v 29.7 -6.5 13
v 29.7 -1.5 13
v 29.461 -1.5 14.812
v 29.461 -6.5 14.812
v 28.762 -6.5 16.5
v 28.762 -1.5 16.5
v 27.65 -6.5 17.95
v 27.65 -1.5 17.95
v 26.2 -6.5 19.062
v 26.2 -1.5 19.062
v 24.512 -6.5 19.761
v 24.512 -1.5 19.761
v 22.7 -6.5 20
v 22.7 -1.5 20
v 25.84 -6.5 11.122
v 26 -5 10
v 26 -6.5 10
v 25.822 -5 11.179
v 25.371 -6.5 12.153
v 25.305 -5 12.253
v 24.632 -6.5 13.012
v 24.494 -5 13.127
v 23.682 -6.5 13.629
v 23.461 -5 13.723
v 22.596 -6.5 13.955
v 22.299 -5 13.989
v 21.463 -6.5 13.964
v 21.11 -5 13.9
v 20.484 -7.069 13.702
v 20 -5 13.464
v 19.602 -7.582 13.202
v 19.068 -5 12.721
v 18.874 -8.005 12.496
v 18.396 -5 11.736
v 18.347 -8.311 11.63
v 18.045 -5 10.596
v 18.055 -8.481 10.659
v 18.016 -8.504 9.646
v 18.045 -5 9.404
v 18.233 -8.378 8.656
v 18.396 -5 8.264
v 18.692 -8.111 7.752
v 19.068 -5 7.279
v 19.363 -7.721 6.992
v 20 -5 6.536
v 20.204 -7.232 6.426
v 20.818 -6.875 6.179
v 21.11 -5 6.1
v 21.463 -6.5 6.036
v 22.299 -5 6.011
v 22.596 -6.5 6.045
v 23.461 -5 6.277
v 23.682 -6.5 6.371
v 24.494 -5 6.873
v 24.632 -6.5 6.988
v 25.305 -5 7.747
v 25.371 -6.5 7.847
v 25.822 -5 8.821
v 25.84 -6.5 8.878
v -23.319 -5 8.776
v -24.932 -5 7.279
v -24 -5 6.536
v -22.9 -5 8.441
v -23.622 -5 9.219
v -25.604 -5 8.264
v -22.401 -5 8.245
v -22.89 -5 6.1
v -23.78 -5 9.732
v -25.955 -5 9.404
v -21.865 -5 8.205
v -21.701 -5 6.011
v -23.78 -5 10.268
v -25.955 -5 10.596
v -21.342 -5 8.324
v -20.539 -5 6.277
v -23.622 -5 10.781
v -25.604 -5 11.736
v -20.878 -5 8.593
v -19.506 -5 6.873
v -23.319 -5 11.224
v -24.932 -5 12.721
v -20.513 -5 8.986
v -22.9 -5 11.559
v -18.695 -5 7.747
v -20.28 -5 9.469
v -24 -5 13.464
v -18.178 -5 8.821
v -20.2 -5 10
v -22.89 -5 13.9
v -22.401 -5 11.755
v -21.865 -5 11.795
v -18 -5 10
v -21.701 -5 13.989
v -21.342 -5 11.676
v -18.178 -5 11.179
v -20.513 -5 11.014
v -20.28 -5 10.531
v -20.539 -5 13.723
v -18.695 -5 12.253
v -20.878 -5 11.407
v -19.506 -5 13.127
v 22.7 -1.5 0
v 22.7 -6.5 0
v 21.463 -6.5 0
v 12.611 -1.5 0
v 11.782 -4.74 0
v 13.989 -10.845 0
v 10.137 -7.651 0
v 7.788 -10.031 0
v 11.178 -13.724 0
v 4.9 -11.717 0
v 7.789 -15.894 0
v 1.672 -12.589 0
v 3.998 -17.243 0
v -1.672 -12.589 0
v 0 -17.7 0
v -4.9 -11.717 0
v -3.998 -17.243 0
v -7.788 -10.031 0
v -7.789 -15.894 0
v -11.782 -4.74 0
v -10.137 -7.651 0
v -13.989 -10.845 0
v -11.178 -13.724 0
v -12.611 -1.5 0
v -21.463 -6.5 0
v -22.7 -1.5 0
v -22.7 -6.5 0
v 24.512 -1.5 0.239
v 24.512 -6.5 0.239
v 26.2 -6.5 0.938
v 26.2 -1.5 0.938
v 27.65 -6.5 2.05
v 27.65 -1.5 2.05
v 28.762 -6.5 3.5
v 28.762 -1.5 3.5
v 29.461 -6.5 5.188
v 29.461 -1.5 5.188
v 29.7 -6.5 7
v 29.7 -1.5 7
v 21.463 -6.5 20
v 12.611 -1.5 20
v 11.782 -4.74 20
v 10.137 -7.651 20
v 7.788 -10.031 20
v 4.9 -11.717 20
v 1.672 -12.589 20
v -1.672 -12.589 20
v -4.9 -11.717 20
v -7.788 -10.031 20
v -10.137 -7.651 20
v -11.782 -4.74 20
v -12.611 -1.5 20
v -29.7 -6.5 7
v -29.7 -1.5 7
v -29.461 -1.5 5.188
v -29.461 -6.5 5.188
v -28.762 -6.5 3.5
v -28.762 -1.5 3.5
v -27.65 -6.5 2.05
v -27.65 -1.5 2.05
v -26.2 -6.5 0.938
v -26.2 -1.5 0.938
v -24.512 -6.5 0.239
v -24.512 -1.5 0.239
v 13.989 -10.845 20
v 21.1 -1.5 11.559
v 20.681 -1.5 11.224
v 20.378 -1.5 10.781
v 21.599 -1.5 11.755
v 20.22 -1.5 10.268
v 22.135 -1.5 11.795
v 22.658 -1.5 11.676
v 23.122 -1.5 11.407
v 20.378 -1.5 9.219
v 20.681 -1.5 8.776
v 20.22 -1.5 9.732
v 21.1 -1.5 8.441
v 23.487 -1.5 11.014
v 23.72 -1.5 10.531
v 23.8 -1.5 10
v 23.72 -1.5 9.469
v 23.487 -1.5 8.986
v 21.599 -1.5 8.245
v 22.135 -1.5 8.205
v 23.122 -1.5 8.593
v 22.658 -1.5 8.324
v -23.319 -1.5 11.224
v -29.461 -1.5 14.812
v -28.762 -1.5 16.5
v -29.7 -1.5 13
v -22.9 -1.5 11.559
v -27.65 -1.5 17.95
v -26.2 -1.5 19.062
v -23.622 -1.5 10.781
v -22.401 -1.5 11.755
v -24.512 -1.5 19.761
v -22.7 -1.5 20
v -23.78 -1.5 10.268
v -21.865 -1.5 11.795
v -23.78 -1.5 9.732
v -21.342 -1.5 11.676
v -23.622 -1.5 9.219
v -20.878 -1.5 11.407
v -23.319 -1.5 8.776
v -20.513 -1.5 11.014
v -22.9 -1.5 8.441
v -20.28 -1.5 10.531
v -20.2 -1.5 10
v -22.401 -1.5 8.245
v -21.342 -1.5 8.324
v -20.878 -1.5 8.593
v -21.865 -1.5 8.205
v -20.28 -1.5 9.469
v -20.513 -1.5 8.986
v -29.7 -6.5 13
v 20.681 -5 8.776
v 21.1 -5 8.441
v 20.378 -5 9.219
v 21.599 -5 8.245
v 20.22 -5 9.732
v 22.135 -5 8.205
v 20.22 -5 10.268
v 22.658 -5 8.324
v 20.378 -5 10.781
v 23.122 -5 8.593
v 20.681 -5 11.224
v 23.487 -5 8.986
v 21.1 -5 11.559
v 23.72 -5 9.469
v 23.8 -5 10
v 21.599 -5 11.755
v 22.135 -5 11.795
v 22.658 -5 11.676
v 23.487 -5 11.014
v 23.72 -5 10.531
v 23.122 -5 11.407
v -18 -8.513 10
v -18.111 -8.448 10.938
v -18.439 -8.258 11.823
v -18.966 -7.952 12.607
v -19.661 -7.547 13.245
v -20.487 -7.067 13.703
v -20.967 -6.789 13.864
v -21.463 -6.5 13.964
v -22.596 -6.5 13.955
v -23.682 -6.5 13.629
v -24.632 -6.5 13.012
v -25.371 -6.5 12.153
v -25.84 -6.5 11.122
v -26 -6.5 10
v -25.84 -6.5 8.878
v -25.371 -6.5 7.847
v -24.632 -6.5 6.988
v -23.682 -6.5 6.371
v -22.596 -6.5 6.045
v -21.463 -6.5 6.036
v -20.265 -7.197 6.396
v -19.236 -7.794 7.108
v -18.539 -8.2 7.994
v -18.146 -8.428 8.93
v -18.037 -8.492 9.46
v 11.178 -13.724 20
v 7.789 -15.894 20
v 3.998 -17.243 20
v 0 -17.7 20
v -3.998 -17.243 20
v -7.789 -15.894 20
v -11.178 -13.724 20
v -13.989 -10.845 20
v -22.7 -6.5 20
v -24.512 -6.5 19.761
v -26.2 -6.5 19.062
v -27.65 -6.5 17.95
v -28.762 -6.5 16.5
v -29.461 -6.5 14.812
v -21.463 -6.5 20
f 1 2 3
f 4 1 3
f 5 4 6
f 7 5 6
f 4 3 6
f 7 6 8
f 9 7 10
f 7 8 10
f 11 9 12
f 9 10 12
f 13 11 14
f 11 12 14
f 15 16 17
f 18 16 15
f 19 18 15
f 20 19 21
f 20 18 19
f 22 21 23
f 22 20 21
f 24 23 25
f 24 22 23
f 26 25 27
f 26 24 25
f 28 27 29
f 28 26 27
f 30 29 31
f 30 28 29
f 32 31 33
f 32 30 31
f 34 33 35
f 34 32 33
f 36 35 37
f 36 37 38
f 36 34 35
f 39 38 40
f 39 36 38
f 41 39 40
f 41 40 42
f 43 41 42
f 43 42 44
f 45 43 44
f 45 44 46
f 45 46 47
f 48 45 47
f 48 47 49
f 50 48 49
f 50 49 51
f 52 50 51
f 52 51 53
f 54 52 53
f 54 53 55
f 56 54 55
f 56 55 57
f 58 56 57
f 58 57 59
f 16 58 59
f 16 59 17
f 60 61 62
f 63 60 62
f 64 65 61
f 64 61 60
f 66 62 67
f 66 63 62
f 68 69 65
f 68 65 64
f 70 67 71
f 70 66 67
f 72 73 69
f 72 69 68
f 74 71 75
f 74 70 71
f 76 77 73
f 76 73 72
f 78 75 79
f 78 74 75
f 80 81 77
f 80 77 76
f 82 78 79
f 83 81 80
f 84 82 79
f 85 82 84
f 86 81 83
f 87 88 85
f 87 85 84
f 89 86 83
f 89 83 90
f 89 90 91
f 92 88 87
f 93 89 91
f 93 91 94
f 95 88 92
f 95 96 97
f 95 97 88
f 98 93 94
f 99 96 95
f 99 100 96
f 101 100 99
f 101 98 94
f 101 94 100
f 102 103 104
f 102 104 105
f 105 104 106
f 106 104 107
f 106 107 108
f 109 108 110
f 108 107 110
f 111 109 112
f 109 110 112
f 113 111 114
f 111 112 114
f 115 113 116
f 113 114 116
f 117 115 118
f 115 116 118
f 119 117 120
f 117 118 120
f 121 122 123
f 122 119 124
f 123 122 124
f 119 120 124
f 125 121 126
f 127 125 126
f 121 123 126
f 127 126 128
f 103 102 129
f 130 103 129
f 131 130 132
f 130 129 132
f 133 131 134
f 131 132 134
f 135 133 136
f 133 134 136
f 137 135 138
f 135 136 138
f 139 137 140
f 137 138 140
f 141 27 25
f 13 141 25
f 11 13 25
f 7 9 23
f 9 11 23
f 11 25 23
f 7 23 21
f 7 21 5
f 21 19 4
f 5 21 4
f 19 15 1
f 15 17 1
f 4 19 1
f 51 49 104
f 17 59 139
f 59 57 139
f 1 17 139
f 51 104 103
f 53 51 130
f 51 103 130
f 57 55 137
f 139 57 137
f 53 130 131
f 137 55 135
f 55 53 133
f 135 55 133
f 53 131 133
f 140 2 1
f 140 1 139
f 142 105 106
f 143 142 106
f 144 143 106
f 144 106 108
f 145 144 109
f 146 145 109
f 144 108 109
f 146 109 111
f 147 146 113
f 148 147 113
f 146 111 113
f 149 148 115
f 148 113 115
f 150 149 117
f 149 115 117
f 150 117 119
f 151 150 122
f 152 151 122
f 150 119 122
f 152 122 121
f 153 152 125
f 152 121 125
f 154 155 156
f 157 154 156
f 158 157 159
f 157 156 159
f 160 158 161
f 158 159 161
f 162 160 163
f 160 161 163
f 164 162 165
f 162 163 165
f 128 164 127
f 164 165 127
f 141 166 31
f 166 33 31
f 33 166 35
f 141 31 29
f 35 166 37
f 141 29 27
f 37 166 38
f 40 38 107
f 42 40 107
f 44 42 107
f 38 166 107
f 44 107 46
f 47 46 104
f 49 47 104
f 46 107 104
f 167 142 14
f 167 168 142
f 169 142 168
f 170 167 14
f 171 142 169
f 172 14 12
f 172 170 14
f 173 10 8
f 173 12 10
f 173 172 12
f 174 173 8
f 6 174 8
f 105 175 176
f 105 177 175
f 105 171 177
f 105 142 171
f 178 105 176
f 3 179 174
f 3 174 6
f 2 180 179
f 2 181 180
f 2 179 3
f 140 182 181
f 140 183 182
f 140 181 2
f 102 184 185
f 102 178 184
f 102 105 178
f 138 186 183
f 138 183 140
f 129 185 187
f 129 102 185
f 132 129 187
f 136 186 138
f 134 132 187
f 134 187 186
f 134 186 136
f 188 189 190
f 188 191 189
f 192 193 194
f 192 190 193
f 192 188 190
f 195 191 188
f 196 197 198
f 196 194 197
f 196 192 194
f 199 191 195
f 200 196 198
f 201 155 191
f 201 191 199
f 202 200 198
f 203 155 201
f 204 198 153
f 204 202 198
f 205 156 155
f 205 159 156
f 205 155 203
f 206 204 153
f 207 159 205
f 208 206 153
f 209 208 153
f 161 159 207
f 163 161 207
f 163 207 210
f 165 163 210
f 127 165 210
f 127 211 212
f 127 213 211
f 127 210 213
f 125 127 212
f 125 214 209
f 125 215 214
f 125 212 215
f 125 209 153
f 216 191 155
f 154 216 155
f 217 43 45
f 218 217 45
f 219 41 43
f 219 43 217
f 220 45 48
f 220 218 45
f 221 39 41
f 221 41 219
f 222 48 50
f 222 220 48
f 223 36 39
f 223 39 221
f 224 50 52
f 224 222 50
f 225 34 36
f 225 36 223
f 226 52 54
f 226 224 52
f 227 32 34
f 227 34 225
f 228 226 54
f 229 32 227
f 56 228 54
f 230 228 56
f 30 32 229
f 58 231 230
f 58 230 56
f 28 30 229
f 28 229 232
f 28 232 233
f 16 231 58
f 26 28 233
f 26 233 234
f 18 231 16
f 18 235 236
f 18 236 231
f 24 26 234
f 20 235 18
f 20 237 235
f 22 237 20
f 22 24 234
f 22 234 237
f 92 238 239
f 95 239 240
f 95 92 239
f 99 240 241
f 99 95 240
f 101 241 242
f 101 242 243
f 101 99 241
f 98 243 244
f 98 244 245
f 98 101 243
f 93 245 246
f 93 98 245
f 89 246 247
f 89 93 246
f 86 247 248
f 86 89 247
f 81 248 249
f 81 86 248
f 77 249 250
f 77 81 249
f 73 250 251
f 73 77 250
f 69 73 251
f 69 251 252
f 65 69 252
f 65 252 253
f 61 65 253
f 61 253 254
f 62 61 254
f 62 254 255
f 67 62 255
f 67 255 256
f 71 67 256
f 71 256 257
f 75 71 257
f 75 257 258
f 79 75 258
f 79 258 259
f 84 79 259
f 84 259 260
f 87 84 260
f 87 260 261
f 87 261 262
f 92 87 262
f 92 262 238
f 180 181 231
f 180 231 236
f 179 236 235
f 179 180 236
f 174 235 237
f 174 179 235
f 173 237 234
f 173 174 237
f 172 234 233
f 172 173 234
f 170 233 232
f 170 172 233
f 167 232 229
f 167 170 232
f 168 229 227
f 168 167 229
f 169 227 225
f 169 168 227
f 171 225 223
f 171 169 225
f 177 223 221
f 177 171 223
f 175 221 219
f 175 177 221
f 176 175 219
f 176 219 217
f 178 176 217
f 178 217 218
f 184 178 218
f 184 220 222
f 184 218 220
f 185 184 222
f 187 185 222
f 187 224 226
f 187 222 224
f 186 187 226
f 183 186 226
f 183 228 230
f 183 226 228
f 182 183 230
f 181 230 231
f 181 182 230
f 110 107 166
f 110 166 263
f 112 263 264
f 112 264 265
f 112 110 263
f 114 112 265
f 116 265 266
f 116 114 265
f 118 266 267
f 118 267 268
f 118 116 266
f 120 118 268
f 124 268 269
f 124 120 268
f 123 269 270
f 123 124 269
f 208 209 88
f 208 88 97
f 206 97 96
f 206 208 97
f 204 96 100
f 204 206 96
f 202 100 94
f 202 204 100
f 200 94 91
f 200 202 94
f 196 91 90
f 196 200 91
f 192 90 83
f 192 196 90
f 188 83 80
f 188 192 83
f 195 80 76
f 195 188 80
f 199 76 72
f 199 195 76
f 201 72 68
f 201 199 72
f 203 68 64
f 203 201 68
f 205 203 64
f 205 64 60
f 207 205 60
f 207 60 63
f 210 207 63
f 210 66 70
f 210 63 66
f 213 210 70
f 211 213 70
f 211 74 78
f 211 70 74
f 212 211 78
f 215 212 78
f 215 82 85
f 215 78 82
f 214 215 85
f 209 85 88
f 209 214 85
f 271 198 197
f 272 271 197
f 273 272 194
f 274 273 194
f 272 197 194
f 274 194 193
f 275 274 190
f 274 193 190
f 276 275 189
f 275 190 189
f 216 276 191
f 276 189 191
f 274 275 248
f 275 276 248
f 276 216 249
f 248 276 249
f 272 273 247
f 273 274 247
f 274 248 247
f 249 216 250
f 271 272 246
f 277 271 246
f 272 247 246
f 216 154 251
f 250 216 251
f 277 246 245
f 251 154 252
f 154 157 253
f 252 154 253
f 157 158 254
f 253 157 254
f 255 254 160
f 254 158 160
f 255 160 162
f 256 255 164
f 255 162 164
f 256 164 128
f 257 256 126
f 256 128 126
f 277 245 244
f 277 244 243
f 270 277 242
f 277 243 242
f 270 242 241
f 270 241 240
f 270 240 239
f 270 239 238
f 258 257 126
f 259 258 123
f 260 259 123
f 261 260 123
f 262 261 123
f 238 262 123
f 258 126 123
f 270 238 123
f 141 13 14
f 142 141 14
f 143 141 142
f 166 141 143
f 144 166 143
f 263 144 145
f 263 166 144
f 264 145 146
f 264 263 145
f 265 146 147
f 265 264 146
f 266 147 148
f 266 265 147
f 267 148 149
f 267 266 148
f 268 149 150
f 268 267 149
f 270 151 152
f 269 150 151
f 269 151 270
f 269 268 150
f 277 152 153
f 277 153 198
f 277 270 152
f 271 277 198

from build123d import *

# Parameters (mm, degrees)
CYLINDER001_R     = 4
CYLINDER001_DEPTH = 20
CYLINDER_R        = 1.8
CYLINDER_DEPTH    = 20
ARRAY_X_COUNT     = 2
ARRAY_X_PITCH     = 44
PAD_DEPTH         = 20
PAD001_DEPTH      = 5


with BuildPart() as bolt_head_hole:
    # Cylinder001 → Cylinder001 (new body)
    with BuildSketch(Plane.XZ):
        Circle(CYLINDER001_R)
    extrude(amount=CYLINDER001_DEPTH)


with BuildPart() as bolt_hole_array:
    # Cylinder → Cylinder (new body)
    with BuildSketch(Plane.XZ.offset(-10)):
        Circle(CYLINDER_R)
    extrude(amount=CYLINDER_DEPTH)

    # Fusion: union bolt head hole
    add(bolt_head_hole.part)

    # Array X: bolt hole array ×2


with BuildPart() as bolt_hole_array_1:
    add(bolt_hole_array.part)
    with Locations(*[(i * ARRAY_X_PITCH, 0, 0) for i in range(1, ARRAY_X_COUNT)]):
        add(bolt_hole_array.part)


with BuildPart() as bolt_hole_array_2:
    # Array placement: moved
    add(bolt_hole_array_1.part.moved(Location((-22, -5, 10))))


with BuildPart() as f_25_mm_attachment_body:
    # Sketch → Pad (new body)
    with BuildSketch(Plane.XY):
        with BuildLine():
            ThreePointArc((12.611106, 1.5), (0, 12.7), (-12.611106, 1.5))
            Line((-22.7, 1.5), (-12.611106, 1.5))
            Line((-22.7, 1.5), (-22.7, 6.5))
            Line((-22.7, 6.5), (-21.463293, 6.5))
            Line((-21.463293, 6.5), (-13.988671, 10.84468))
            ThreePointArc((13.988671, 10.84468), (0, 17.7), (-13.988671, 10.84468))
            Line((13.988671, 10.84468), (21.463293, 6.5))
            Line((21.463293, 6.5), (22.7, 6.5))
            Line((22.7, 6.5), (22.7, 1.5))
            Line((12.611106, 1.5), (22.7, 1.5))
        make_face()
    extrude(amount=PAD_DEPTH)

    # Sketch001 → Pad001 (join)
    with BuildSketch(Plane.XZ.offset(-1.5)):
        with BuildLine():
            Line((-12.611106, 20), (-22.7, 20))
            ThreePointArc((-22.7, 20), (-27.649747, 17.949747), (-29.7, 13))
            Line((-29.7, 13), (-29.7, 7))
            ThreePointArc((-29.7, 7), (-27.649747, 2.050253), (-22.7, 0))
            Line((-12.611106, 0), (-22.7, 0))
            Line((-12.611106, 20), (-12.611106, 0))
        make_face()
        with BuildLine():
            Line((12.611106, 20), (22.7, 20))
            ThreePointArc((29.7, 13), (27.649747, 17.949747), (22.7, 20))
            Line((29.7, 13), (29.7, 7))
            ThreePointArc((22.7, 0), (27.649747, 2.050253), (29.7, 7))
            Line((22.7, 0), (12.611106, 0))
            Line((12.611106, 20), (12.611106, 0))
        make_face()
    extrude(amount=-PAD001_DEPTH)


with BuildPart() as f_25_mm_attachment_holed_clone:
    # Part__Mirroring: instance of 25 mm attachment body
    add(f_25_mm_attachment_body.part.mirror(Plane(origin=(0, 0, 0), x_dir=(1, 0, 0), z_dir=(0, 1, 0))))

    # Cut: cut bolt hole array
    add(bolt_hole_array_2.part, mode=Mode.SUBTRACT)


solid = f_25_mm_attachment_holed_clone.part
